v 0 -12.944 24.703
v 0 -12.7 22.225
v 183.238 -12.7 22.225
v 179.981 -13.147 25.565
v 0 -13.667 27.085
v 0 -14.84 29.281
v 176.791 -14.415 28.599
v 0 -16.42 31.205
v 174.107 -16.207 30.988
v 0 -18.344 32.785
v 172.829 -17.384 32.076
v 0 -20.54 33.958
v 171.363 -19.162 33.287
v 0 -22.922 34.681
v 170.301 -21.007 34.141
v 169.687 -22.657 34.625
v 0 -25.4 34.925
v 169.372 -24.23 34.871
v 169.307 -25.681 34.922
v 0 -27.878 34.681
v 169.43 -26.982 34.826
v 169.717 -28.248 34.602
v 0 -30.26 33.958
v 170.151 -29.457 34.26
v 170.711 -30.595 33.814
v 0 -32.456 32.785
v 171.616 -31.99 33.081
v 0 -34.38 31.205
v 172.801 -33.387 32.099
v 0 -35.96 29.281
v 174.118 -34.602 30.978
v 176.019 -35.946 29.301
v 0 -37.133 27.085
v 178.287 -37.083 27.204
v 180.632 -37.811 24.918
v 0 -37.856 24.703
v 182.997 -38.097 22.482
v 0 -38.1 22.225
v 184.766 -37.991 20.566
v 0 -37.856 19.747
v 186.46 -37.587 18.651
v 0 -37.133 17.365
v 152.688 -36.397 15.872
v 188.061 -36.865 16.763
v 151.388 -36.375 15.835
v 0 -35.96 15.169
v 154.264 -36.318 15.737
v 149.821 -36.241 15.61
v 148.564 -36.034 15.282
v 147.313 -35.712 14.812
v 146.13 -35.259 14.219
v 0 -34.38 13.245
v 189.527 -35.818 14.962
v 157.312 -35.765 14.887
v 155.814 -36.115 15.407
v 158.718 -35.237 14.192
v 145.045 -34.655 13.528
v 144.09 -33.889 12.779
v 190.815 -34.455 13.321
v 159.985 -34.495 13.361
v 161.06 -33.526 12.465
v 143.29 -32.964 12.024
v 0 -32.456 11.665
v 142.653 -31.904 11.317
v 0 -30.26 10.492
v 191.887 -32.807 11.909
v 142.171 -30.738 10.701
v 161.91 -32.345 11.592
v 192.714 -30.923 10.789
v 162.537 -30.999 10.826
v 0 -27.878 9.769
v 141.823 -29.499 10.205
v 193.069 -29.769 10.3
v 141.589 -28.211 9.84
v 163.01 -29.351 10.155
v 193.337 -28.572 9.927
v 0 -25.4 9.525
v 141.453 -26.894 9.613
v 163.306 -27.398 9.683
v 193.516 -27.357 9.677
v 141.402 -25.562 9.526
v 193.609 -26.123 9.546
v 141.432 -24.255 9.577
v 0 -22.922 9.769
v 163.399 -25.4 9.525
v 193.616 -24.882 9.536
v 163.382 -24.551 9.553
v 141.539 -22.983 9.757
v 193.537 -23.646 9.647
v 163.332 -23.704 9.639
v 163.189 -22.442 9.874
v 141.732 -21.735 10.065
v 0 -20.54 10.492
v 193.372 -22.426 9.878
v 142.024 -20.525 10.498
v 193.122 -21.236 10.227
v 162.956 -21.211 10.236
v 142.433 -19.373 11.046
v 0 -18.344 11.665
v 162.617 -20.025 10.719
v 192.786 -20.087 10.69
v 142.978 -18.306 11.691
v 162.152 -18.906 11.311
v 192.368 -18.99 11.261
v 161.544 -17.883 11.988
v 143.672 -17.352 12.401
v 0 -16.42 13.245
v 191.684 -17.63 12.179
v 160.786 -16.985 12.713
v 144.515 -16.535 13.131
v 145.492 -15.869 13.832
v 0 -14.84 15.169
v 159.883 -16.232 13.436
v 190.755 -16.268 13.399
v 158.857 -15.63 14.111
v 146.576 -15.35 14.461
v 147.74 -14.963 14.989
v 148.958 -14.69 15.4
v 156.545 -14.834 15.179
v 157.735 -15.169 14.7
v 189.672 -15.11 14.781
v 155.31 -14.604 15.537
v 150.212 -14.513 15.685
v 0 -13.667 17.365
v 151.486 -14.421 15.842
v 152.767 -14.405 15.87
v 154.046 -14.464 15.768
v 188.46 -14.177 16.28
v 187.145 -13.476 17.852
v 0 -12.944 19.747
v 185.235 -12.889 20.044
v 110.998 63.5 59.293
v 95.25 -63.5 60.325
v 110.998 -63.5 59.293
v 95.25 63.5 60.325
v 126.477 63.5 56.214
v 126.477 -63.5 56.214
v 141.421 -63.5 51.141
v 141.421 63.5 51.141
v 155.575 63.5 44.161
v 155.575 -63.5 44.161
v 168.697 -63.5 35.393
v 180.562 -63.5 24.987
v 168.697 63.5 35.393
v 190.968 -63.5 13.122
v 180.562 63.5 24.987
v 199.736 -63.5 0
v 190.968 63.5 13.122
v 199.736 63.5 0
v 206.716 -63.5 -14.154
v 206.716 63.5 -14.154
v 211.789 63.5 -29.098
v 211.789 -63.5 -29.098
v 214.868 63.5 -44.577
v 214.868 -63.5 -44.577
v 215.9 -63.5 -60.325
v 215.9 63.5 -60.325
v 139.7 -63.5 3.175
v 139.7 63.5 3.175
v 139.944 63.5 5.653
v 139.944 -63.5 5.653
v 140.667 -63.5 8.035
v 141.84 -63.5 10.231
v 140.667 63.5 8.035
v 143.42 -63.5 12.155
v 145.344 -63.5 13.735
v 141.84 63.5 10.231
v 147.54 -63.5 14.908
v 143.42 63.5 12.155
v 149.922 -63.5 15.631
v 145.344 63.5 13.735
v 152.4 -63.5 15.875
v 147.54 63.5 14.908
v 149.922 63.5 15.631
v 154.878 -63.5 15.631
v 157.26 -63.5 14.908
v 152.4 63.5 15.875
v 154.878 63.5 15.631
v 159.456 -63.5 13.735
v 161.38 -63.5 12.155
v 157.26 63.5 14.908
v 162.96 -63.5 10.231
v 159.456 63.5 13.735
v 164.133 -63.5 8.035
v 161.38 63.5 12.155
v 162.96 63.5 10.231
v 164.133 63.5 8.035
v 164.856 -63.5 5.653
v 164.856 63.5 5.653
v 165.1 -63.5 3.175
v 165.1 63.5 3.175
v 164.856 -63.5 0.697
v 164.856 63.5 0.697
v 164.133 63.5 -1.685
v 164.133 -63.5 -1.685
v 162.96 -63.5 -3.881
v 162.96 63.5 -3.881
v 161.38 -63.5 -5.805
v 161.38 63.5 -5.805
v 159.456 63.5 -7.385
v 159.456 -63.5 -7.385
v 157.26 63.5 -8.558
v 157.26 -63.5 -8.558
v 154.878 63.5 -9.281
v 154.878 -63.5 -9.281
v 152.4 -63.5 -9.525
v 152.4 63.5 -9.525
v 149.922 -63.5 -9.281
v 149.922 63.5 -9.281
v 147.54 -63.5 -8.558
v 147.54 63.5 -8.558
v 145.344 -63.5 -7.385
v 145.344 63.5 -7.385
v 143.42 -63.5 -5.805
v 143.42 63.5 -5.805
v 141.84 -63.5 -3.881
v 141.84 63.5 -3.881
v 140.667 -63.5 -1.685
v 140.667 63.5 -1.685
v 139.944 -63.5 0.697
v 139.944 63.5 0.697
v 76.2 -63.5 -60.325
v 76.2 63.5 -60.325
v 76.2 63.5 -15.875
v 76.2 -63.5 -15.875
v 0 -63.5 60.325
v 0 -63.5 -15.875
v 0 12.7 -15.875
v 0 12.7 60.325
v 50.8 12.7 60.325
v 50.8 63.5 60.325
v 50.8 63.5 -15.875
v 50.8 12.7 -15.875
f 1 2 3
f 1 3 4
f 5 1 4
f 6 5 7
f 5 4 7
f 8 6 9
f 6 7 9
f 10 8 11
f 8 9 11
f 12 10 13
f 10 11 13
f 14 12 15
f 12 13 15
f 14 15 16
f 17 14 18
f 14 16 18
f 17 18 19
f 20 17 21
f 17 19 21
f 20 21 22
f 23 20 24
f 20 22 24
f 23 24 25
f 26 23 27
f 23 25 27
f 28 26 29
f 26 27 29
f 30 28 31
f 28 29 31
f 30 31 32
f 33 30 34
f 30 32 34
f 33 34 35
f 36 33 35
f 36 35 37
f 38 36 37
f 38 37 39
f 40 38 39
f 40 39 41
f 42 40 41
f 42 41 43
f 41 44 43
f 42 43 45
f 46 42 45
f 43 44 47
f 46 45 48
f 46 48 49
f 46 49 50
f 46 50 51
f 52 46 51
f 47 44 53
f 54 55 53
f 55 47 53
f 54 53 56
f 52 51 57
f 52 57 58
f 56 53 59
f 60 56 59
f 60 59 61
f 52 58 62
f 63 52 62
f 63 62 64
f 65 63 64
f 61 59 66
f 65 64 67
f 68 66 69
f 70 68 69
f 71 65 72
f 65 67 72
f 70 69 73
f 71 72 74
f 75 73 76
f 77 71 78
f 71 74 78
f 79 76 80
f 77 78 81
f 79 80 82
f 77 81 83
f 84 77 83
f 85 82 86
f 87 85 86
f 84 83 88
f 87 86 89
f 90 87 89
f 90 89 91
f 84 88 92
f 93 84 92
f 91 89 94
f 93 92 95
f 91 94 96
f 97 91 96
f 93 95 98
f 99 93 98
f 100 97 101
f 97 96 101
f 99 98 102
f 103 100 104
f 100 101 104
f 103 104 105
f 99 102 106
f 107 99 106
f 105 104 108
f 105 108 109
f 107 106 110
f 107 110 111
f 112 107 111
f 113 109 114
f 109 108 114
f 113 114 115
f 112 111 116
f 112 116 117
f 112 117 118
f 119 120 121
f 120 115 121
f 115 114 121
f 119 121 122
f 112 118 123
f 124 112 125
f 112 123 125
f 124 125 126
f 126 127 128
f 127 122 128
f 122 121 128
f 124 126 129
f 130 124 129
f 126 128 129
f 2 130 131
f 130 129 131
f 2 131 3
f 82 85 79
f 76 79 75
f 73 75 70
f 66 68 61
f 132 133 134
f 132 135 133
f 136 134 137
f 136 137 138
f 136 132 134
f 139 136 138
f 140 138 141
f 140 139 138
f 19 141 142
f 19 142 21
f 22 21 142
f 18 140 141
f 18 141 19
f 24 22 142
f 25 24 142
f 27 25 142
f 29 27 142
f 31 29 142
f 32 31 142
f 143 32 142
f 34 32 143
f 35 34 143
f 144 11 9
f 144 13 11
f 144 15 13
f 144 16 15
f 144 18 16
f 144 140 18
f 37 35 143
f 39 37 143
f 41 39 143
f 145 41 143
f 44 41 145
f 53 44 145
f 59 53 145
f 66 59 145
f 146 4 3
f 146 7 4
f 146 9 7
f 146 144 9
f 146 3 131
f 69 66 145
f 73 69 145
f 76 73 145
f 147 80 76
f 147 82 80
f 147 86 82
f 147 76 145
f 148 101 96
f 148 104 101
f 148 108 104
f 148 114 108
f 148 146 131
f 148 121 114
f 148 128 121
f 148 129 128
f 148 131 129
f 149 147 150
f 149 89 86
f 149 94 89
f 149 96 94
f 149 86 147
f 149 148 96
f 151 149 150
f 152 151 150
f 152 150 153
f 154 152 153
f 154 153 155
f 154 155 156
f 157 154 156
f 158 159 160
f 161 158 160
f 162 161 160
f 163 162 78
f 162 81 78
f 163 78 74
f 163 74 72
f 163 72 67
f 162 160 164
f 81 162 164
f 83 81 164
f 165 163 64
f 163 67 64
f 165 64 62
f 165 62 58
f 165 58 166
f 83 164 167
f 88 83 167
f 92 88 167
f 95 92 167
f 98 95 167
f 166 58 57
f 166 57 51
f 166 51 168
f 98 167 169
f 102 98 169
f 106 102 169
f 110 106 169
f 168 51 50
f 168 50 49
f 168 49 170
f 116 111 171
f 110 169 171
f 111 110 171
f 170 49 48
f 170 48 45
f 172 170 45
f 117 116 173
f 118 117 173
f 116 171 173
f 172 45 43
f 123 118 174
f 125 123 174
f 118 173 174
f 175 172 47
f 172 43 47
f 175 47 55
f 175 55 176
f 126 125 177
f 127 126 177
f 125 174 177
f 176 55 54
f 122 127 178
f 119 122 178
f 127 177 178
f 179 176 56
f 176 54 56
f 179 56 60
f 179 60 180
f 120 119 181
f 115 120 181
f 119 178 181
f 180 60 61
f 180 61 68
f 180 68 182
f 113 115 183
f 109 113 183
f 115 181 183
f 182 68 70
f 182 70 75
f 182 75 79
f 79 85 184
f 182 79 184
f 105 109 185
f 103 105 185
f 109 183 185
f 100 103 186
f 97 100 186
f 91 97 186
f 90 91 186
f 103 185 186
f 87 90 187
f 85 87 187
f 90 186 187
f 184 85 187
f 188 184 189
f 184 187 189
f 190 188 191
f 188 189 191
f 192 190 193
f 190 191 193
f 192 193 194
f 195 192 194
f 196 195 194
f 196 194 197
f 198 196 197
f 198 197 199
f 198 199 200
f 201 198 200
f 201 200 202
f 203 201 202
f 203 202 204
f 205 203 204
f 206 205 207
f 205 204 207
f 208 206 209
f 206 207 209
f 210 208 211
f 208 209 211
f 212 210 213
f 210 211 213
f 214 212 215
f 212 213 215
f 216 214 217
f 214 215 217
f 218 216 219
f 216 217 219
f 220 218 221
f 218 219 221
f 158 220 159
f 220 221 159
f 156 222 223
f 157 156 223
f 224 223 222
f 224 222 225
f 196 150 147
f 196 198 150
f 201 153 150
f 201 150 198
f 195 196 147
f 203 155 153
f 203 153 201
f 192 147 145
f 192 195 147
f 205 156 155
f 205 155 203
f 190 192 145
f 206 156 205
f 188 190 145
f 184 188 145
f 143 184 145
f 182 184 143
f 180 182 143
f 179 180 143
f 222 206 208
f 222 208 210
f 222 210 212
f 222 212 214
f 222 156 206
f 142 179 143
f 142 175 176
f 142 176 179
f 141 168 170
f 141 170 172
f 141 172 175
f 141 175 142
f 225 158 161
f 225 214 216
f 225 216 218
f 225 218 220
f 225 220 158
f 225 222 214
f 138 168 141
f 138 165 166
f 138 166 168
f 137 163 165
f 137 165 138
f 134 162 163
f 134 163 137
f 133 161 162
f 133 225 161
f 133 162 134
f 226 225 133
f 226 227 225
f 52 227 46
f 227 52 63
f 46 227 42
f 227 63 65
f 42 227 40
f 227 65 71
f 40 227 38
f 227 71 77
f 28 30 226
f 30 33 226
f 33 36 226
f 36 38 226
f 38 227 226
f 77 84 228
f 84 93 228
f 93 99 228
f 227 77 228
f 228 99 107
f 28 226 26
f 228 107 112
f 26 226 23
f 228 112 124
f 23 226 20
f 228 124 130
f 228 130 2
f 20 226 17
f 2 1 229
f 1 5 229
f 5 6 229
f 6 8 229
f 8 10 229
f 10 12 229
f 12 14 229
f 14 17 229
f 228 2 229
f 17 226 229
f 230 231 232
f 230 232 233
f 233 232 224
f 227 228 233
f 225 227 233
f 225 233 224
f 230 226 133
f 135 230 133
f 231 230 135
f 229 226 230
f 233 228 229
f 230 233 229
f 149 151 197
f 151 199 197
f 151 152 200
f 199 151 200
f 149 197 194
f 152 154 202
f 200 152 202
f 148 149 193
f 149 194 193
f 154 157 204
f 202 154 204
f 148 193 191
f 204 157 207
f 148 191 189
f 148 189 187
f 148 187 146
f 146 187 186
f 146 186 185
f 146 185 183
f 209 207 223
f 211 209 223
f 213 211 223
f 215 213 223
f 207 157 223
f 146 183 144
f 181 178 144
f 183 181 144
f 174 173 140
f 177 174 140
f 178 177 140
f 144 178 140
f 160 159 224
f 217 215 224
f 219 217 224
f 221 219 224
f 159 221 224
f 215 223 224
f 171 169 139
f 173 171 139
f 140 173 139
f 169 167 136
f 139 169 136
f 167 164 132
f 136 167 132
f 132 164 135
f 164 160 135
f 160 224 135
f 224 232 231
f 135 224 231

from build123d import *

# Parameters (mm, degrees)
F0_W     = 127
F0_H     = 120.65
F1_DEPTH = 215.9
F2_W     = 76.2
F2_H     = 44.45
F3_DEPTH = 127
F4_W     = 50.8
F4_H     = 76.2
F5_DEPTH = 50.8
F8_D     = 25.4
F8_DEPTH = 127
F8_TIP   = 7.6309298617
F9_R     = 120.64999
F10_D    = 25.4


# Not quite as in the source:
# - a fillet or chamfer is up to 0.001 mm smaller than in the source, because OpenCascade refuses the exact size


with BuildPart() as f1:
    # F0 (on Right) → F1 (new body)
    with BuildSketch(Plane.YZ):
        Rectangle(F0_W, F0_H)
    extrude(amount=F1_DEPTH)

    # F2 (on face) → F3 (cut)
    with BuildSketch(Plane.XZ.offset(63.5)):
        with Locations((38.1, -38.1)):
            Rectangle(F2_W, F2_H)
    extrude(amount=-F3_DEPTH, mode=Mode.SUBTRACT)

    # F4 (on face) → F5 (cut)
    with BuildSketch(Plane(origin=(0, 0, 0), x_dir=(0, -1, 0), z_dir=(-1, 0, 0))):
        with Locations((-38.1, 22.225)):
            Rectangle(F4_W, F4_H)
    extrude(amount=-F5_DEPTH, mode=Mode.SUBTRACT)

    # F8
    with Locations(Plane.XZ.offset(63.5)):
        with Locations((152.4, 3.175)):
            Hole(F8_D / 2, depth=F8_DEPTH)
            with Locations((0, 0, -(F8_DEPTH + F8_TIP / 2))):  # 118° drill point
                Cone(0, F8_D / 2, F8_TIP, mode=Mode.SUBTRACT)

    # F9 (radius 120.65 in the source; OpenCascade refuses exactly that, so slightly less here)
    f9_edges = [f1.edges().sort_by_distance(p)[0] for p in [
        (215.9, 0, 60.325),
    ]]
    fillet(f9_edges, radius=F9_R)

    # F10 (through all)
    with Locations(Plane(origin=(0, 0, 0), x_dir=(0, -1, 0), z_dir=(-1, 0, 0))):
        with Locations((25.4, 22.225)):
            Hole(F10_D / 2)


solid = f1.part
